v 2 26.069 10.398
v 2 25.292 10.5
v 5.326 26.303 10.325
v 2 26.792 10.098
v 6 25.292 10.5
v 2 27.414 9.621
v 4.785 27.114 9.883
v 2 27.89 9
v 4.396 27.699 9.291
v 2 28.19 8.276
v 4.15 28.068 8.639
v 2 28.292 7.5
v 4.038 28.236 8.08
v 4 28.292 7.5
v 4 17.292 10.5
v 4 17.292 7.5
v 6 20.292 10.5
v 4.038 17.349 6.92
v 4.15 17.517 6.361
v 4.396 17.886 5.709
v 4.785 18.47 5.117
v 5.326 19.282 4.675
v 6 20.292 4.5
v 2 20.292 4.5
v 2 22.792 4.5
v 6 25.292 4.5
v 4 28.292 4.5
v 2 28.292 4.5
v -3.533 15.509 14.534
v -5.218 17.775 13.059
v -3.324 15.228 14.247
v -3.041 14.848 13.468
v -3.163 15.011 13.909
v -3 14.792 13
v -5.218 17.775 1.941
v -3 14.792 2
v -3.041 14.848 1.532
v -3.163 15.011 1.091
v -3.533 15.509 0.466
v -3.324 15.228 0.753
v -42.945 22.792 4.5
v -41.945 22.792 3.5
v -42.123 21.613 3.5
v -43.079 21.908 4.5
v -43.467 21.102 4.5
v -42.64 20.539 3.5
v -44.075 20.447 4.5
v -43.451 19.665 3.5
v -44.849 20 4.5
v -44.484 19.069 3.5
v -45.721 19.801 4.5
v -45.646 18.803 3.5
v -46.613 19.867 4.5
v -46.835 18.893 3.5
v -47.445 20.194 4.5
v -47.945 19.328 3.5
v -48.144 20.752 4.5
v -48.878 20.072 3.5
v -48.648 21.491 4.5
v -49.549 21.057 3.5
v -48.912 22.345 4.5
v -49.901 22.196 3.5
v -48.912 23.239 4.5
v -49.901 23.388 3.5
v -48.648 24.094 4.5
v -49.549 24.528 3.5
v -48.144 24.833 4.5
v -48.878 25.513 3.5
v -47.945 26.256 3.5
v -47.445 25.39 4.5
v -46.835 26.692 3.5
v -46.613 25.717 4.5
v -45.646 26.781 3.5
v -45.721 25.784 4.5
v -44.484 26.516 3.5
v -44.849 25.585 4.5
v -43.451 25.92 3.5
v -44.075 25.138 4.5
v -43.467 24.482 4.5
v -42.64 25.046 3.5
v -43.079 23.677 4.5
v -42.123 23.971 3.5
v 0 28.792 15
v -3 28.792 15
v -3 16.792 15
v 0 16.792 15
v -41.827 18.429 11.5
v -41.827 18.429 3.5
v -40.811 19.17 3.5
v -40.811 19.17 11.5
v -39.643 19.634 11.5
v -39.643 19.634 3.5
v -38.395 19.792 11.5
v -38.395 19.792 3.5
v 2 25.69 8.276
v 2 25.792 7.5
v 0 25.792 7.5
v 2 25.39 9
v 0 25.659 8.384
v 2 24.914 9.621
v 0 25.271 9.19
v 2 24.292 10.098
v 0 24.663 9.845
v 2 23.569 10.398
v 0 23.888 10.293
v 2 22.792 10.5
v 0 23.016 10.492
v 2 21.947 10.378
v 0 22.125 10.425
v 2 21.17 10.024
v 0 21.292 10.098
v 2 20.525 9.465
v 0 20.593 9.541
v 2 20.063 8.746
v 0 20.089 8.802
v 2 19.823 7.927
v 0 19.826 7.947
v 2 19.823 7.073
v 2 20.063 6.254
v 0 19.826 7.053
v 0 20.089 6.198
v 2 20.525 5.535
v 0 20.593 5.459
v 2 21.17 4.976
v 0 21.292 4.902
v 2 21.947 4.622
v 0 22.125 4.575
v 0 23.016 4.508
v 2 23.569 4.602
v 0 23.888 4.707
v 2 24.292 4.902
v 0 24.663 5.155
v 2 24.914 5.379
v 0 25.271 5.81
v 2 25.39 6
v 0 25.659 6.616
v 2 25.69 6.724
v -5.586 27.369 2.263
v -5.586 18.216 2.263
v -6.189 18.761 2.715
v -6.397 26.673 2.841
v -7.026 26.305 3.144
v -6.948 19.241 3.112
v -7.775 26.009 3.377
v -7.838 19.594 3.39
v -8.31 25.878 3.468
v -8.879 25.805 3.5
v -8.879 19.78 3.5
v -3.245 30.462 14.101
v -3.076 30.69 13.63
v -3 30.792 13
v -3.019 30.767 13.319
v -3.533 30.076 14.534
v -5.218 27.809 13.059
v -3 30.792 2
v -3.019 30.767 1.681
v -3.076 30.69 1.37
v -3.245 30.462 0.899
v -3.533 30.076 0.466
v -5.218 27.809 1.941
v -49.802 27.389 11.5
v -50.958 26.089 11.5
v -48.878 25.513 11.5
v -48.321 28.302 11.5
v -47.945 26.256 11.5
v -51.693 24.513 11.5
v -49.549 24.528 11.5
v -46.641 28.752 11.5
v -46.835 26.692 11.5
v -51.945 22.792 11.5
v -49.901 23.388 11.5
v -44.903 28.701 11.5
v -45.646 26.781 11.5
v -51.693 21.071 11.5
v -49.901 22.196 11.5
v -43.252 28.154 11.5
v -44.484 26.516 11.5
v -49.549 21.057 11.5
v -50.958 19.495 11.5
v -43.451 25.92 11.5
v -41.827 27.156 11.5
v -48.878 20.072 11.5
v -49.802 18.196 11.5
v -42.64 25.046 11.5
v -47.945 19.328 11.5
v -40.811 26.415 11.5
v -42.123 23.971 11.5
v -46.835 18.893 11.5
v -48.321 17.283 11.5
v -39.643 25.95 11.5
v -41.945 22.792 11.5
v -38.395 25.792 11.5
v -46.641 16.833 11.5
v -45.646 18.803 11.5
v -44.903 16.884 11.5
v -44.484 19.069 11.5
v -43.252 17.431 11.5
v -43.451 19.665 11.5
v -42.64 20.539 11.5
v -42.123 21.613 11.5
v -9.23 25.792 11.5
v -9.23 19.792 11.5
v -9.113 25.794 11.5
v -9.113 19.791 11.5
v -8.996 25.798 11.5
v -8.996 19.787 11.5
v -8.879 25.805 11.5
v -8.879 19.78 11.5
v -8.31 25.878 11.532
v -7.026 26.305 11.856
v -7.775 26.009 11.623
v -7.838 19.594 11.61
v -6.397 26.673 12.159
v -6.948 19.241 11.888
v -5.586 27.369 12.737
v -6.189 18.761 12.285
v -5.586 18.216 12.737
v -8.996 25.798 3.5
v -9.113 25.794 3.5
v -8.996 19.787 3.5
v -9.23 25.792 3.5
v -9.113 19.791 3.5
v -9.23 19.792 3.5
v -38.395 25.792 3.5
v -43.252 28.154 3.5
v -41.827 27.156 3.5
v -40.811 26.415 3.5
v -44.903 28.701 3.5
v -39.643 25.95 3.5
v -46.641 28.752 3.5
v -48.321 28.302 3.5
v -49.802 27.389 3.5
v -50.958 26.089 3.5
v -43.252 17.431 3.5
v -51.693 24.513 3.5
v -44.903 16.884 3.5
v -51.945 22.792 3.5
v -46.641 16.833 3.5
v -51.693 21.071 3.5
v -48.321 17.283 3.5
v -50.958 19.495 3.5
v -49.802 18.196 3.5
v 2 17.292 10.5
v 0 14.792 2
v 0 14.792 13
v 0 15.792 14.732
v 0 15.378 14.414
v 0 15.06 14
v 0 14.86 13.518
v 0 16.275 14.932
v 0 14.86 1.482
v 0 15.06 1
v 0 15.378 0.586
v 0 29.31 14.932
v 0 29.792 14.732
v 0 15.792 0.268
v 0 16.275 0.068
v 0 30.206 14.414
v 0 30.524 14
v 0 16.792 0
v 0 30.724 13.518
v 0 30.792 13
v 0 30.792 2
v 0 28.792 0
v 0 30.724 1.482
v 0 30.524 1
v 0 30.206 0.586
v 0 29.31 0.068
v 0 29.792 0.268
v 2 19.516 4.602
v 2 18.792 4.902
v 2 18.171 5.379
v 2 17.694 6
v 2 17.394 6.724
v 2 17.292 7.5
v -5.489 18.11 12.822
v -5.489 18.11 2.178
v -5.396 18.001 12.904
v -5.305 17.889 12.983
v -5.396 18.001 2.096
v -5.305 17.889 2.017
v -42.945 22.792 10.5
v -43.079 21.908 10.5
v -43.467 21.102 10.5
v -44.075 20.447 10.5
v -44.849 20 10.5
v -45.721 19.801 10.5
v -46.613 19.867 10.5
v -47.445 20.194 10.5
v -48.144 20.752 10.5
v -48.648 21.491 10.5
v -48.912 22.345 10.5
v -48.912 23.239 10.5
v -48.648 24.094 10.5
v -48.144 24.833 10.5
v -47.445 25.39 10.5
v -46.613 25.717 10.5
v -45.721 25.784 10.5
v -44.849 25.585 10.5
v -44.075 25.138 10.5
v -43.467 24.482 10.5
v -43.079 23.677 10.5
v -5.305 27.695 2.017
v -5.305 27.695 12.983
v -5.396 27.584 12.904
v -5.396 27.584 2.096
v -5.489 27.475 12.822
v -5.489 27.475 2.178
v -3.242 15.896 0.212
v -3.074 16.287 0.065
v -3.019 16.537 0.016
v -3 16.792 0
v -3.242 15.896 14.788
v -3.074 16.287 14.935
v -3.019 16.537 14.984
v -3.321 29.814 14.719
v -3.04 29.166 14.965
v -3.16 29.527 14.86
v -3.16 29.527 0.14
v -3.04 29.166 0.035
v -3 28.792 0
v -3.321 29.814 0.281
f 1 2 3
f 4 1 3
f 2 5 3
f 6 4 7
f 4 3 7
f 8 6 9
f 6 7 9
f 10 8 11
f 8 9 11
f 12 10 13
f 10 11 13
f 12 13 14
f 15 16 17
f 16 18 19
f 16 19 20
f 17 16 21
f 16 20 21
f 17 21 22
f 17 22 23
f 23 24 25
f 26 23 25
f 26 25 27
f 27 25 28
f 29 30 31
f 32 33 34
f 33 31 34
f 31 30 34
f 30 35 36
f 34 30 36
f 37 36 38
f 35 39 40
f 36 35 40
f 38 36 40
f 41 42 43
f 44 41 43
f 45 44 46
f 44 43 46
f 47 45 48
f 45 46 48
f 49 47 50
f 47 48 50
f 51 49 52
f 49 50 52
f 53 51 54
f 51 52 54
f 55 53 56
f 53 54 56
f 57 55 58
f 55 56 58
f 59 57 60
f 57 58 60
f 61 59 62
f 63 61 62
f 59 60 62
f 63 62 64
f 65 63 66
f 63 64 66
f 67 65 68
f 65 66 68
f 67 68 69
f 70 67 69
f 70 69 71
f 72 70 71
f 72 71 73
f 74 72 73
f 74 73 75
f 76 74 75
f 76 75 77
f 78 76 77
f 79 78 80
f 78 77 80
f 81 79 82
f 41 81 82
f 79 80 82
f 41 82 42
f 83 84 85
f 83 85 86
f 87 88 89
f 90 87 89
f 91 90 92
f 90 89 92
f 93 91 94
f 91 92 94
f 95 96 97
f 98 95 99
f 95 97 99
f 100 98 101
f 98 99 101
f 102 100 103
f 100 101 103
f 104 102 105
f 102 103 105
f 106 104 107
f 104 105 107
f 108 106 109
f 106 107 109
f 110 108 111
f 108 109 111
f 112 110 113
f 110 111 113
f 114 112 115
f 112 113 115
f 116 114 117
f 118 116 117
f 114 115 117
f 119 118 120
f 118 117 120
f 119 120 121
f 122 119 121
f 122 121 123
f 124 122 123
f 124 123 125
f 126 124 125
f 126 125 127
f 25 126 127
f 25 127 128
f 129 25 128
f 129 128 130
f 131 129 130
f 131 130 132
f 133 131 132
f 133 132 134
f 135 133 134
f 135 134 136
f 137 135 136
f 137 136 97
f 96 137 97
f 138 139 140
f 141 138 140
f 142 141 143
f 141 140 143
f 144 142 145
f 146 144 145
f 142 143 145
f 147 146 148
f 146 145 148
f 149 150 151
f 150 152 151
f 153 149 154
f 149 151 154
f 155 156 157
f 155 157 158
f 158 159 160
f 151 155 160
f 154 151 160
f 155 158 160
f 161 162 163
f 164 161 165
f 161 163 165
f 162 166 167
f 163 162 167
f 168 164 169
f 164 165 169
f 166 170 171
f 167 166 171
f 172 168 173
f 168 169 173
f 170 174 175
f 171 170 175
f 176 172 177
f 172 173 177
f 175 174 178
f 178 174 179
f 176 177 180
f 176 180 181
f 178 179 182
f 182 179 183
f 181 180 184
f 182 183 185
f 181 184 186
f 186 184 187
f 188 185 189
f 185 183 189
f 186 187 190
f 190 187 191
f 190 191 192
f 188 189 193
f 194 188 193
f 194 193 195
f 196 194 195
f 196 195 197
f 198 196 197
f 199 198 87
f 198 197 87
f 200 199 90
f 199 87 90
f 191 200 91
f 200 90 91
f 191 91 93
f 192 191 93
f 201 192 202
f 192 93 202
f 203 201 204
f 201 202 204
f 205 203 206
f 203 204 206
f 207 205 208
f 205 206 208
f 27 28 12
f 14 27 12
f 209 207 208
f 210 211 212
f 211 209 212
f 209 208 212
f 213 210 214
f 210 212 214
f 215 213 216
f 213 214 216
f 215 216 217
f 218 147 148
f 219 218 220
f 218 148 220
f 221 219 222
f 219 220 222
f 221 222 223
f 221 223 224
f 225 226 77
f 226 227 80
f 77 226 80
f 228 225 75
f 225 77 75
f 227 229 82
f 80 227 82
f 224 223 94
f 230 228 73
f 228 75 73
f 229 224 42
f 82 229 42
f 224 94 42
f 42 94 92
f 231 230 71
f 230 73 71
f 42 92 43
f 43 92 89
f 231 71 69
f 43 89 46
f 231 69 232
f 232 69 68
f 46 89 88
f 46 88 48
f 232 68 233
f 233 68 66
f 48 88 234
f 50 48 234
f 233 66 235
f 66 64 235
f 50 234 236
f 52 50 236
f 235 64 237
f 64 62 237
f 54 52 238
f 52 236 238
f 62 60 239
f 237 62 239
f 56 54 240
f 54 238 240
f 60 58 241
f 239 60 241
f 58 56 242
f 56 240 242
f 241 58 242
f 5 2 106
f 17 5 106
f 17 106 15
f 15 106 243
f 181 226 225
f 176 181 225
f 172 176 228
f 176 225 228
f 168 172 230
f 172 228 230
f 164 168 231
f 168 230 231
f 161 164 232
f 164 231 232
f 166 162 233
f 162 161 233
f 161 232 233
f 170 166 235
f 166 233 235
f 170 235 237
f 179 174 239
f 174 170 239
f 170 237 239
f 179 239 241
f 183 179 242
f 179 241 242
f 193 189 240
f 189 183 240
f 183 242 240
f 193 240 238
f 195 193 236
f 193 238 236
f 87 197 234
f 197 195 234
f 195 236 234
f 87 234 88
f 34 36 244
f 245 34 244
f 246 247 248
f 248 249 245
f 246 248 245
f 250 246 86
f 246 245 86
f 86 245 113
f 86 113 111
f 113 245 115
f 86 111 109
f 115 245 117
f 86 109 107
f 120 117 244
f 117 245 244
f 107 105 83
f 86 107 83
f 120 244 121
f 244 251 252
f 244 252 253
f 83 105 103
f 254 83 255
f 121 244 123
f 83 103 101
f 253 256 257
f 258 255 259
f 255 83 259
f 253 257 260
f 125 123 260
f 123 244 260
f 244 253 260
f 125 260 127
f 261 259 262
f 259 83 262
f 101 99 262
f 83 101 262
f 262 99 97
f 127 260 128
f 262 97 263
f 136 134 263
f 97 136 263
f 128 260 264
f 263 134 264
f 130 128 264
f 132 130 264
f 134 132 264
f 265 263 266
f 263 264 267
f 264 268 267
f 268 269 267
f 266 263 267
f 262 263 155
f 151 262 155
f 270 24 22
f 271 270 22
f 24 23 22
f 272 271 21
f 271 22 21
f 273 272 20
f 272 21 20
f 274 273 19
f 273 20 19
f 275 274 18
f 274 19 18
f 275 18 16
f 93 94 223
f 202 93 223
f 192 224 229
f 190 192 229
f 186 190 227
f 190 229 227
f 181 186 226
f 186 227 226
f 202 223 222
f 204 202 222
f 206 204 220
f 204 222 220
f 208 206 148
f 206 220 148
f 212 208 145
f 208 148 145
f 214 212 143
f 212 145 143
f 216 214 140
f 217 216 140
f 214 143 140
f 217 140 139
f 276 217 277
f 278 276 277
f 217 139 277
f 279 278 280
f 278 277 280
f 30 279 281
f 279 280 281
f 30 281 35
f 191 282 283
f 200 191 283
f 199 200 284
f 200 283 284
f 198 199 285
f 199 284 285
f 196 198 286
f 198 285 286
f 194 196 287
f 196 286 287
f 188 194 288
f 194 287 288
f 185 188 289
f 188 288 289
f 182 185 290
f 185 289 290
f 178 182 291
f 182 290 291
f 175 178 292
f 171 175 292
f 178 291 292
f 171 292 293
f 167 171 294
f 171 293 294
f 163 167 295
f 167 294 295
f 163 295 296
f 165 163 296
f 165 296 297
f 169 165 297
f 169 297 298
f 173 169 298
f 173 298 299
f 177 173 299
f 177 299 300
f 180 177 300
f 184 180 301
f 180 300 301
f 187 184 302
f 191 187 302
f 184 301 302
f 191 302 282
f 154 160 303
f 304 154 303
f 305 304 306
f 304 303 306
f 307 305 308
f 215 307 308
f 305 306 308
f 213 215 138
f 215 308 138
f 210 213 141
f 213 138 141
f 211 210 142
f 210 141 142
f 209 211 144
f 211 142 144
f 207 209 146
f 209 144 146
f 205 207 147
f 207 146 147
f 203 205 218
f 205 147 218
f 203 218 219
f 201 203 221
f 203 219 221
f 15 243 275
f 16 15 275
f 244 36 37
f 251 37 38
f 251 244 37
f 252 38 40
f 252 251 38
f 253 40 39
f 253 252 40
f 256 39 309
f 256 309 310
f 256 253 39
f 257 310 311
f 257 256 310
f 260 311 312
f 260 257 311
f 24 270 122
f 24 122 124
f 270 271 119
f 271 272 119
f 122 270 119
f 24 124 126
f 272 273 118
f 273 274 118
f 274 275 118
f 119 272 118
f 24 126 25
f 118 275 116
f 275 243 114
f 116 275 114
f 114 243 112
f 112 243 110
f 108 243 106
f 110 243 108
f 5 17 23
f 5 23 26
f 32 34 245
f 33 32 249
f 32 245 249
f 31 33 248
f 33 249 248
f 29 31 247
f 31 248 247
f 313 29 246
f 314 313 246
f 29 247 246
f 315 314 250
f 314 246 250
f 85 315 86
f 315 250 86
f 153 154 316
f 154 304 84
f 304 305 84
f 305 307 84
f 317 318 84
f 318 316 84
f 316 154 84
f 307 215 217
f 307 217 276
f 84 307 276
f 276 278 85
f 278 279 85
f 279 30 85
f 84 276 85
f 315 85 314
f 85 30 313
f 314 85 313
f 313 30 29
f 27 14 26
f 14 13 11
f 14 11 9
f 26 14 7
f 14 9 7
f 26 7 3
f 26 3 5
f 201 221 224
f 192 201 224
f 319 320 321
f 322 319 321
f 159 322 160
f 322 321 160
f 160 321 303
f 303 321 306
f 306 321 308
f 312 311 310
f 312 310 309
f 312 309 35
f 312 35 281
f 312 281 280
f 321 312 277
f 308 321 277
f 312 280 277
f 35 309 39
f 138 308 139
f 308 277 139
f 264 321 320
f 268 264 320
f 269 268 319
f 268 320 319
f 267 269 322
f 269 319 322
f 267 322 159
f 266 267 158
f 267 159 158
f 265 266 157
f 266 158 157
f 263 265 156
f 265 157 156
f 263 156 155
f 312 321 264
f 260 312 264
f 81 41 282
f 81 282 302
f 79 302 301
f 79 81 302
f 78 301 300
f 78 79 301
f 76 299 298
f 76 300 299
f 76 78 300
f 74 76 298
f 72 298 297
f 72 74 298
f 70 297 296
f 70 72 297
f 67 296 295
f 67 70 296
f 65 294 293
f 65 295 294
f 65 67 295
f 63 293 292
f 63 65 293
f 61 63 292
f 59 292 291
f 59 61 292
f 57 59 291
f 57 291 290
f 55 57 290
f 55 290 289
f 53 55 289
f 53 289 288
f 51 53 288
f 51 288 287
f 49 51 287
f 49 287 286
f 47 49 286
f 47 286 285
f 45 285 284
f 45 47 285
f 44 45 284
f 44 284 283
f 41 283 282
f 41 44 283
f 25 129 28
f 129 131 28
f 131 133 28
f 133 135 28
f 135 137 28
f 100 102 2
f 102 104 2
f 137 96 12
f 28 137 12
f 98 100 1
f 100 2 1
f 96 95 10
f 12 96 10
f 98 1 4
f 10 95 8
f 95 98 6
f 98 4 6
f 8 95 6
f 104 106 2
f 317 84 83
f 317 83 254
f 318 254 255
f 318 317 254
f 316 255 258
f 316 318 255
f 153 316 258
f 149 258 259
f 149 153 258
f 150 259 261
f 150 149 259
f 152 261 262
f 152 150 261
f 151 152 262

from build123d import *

# Parameters (mm, degrees)
F0_R      = 3
F1_DEPTH  = 15
F2_R      = 3
F3_DEPTH  = 2
F5_DEPTH  = 4
F7_DEPTH  = 25
F9_DEPTH  = 25
F11_DEPTH = 25
F12_SIZE  = 1
F13_SIZE  = 1
F14_R     = 2
F15_R     = 2
F16_R     = 3


# Not quite as in the source:
# - a feature names something its author has since deleted; it is built from what else it names


with BuildPart() as f1:
    # F0 (on Top) → F1 (new body)
    with BuildSketch(Plane.XY):
        with BuildLine():
            ThreePointArc((-38.3954955959, 25.79224433), (-40.2418679606, 26.1456424436), (-41.8272385211, 27.1558806937))
            ThreePointArc((-41.8272385211, 27.1558806937), (-51.9453300312, 22.79224433), (-41.8272385211, 18.4286079664))
            ThreePointArc((-41.8272385211, 18.4286079664), (-40.2418679606, 19.4388462165), (-38.3954955959, 19.79224433))
            Line((-38.3954955959, 19.79224433), (-9.2304363188, 19.79224433))
            ThreePointArc((-9.2304363188, 19.79224433), (-6.9849852462, 19.2596764203), (-5.2178762474, 17.7754241224))
            Line((-5.2178762474, 17.7754241224), (-3, 14.79224433))
            Line((-3, 14.79224433), (0, 14.79224433))
            Line((0, 14.79224433), (0, 19.79224433))
            Line((0, 19.79224433), (0, 25.79224433))
            Line((0, 25.79224433), (0, 30.79224433))
            Line((0, 30.79224433), (-3, 30.79224433))
            Line((-3, 30.79224433), (-5.2178762474, 27.8090645377))
            ThreePointArc((-5.2178762474, 27.8090645377), (-6.9849852462, 26.3248122398), (-9.2304363188, 25.79224433))
            Line((-9.2304363188, 25.79224433), (-38.3954955959, 25.79224433))
        make_face()
        with Locations((-45.9453300312, 22.79224433)):
            Circle(F0_R, mode=Mode.SUBTRACT)
    extrude(amount=F1_DEPTH)

    # F2 (on face) → F3 (join)
    with BuildSketch(Plane.YZ):
        with Locations((22.79224433, 7.5)):
            Circle(F2_R)
    extrude(amount=F3_DEPTH)

    # F4 (on face) → F5 (join)
    with BuildSketch(Plane.YZ.offset(2)):
        Polygon((17.29224433, 4.5), (26.29224433, 4.5), (28.29224433, 4.5), (28.29224433, 6), (28.29224433, 10.5), (19.29224433, 10.5), (17.29224433, 10.5), (17.29224433, 9), align=None)
    extrude(amount=F5_DEPTH)

    # F6 (on face) → F7 (cut)
    with BuildSketch(Plane(origin=(0, 0, 4.5), x_dir=(1, 0, 0), z_dir=(0, 0, -1))):
        Polygon((6, -17.29224433), (4, -17.29224433), (6, -20.29224433), align=None)
    extrude(amount=-F7_DEPTH, mode=Mode.SUBTRACT)

    # F8 (on face) → F9 (cut)
    with BuildSketch(Plane.XY.offset(10.5)):
        Polygon((6, 28.29224433), (4, 28.29224433), (6, 25.29224433), align=None)
    extrude(amount=-F9_DEPTH, mode=Mode.SUBTRACT)

    # F10 (on face) → F11 (cut)
    with BuildSketch(Plane.XZ.offset(-14.79224433)):
        with BuildLine():
            Line((-52.1873838902, 19.9649333954), (-52.1873838902, 11.5))
            Line((-52.1873838902, 11.5), (-8.8786755805, 11.5))
            ThreePointArc((-8.8786755805, 11.5), (-7.1200422145, 11.8194862799), (-5.5861525412, 12.7371165265))
            Line((-5.5861525412, 12.7371165265), (-3, 15))
            Line((-3, 15), (-3, 19.9649333954))
            Line((-3, 19.9649333954), (-52.1873838902, 19.9649333954))
        make_face()
        with BuildLine():
            Line((-2.2940631025, -5.0414614379), (-3, 0))
            Line((-3, 0), (-5.5861525412, 2.2628834735))
            ThreePointArc((-5.5861525412, 2.2628834735), (-7.1200422145, 3.1805137201), (-8.8786755805, 3.5))
            Line((-8.8786755805, 3.5), (-52.6222039647, 3.5))
            Line((-52.6222039647, 3.5), (-52.6222039647, -5.0414614379))
            Line((-52.6222039647, -5.0414614379), (-2.2940631025, -5.0414614379))
        make_face()
    extrude(amount=-F11_DEPTH, mode=Mode.SUBTRACT)

    # F12
    f12_edges = [f1.edges().sort_by_distance(p)[0] for p in [
        (-48.94533, 22.792244, 11.5),
    ]]
    chamfer(f12_edges, length=F12_SIZE)

    # F13
    f13_edges = [f1.edges().sort_by_distance(p)[0] for p in [
        (-48.94533, 22.792244, 3.5),
    ]]
    chamfer(f13_edges, length=F13_SIZE)

    # F14
    f14_edges = [f1.edges().sort_by_distance(p)[0] for p in [
        (-1.5, 14.792244, 15),
    ]]
    fillet(f14_edges, radius=F14_R)

    # F15
    f15_edges = [f1.edges().sort_by_distance(p)[0] for p in [
        (-1.5, 30.792244, 15),
        (-1.5, 30.792244, 0),
        (-1.5, 14.792244, 0),
    ]]
    fillet(f15_edges, radius=F15_R)

    # F16
    f16_edges = [f1.edges().sort_by_distance(p)[0] for p in [
        (3, 17.292244, 4.5),
        (3, 28.292244, 10.5),
    ]]
    fillet(f16_edges, radius=F16_R)


solid = f1.part
